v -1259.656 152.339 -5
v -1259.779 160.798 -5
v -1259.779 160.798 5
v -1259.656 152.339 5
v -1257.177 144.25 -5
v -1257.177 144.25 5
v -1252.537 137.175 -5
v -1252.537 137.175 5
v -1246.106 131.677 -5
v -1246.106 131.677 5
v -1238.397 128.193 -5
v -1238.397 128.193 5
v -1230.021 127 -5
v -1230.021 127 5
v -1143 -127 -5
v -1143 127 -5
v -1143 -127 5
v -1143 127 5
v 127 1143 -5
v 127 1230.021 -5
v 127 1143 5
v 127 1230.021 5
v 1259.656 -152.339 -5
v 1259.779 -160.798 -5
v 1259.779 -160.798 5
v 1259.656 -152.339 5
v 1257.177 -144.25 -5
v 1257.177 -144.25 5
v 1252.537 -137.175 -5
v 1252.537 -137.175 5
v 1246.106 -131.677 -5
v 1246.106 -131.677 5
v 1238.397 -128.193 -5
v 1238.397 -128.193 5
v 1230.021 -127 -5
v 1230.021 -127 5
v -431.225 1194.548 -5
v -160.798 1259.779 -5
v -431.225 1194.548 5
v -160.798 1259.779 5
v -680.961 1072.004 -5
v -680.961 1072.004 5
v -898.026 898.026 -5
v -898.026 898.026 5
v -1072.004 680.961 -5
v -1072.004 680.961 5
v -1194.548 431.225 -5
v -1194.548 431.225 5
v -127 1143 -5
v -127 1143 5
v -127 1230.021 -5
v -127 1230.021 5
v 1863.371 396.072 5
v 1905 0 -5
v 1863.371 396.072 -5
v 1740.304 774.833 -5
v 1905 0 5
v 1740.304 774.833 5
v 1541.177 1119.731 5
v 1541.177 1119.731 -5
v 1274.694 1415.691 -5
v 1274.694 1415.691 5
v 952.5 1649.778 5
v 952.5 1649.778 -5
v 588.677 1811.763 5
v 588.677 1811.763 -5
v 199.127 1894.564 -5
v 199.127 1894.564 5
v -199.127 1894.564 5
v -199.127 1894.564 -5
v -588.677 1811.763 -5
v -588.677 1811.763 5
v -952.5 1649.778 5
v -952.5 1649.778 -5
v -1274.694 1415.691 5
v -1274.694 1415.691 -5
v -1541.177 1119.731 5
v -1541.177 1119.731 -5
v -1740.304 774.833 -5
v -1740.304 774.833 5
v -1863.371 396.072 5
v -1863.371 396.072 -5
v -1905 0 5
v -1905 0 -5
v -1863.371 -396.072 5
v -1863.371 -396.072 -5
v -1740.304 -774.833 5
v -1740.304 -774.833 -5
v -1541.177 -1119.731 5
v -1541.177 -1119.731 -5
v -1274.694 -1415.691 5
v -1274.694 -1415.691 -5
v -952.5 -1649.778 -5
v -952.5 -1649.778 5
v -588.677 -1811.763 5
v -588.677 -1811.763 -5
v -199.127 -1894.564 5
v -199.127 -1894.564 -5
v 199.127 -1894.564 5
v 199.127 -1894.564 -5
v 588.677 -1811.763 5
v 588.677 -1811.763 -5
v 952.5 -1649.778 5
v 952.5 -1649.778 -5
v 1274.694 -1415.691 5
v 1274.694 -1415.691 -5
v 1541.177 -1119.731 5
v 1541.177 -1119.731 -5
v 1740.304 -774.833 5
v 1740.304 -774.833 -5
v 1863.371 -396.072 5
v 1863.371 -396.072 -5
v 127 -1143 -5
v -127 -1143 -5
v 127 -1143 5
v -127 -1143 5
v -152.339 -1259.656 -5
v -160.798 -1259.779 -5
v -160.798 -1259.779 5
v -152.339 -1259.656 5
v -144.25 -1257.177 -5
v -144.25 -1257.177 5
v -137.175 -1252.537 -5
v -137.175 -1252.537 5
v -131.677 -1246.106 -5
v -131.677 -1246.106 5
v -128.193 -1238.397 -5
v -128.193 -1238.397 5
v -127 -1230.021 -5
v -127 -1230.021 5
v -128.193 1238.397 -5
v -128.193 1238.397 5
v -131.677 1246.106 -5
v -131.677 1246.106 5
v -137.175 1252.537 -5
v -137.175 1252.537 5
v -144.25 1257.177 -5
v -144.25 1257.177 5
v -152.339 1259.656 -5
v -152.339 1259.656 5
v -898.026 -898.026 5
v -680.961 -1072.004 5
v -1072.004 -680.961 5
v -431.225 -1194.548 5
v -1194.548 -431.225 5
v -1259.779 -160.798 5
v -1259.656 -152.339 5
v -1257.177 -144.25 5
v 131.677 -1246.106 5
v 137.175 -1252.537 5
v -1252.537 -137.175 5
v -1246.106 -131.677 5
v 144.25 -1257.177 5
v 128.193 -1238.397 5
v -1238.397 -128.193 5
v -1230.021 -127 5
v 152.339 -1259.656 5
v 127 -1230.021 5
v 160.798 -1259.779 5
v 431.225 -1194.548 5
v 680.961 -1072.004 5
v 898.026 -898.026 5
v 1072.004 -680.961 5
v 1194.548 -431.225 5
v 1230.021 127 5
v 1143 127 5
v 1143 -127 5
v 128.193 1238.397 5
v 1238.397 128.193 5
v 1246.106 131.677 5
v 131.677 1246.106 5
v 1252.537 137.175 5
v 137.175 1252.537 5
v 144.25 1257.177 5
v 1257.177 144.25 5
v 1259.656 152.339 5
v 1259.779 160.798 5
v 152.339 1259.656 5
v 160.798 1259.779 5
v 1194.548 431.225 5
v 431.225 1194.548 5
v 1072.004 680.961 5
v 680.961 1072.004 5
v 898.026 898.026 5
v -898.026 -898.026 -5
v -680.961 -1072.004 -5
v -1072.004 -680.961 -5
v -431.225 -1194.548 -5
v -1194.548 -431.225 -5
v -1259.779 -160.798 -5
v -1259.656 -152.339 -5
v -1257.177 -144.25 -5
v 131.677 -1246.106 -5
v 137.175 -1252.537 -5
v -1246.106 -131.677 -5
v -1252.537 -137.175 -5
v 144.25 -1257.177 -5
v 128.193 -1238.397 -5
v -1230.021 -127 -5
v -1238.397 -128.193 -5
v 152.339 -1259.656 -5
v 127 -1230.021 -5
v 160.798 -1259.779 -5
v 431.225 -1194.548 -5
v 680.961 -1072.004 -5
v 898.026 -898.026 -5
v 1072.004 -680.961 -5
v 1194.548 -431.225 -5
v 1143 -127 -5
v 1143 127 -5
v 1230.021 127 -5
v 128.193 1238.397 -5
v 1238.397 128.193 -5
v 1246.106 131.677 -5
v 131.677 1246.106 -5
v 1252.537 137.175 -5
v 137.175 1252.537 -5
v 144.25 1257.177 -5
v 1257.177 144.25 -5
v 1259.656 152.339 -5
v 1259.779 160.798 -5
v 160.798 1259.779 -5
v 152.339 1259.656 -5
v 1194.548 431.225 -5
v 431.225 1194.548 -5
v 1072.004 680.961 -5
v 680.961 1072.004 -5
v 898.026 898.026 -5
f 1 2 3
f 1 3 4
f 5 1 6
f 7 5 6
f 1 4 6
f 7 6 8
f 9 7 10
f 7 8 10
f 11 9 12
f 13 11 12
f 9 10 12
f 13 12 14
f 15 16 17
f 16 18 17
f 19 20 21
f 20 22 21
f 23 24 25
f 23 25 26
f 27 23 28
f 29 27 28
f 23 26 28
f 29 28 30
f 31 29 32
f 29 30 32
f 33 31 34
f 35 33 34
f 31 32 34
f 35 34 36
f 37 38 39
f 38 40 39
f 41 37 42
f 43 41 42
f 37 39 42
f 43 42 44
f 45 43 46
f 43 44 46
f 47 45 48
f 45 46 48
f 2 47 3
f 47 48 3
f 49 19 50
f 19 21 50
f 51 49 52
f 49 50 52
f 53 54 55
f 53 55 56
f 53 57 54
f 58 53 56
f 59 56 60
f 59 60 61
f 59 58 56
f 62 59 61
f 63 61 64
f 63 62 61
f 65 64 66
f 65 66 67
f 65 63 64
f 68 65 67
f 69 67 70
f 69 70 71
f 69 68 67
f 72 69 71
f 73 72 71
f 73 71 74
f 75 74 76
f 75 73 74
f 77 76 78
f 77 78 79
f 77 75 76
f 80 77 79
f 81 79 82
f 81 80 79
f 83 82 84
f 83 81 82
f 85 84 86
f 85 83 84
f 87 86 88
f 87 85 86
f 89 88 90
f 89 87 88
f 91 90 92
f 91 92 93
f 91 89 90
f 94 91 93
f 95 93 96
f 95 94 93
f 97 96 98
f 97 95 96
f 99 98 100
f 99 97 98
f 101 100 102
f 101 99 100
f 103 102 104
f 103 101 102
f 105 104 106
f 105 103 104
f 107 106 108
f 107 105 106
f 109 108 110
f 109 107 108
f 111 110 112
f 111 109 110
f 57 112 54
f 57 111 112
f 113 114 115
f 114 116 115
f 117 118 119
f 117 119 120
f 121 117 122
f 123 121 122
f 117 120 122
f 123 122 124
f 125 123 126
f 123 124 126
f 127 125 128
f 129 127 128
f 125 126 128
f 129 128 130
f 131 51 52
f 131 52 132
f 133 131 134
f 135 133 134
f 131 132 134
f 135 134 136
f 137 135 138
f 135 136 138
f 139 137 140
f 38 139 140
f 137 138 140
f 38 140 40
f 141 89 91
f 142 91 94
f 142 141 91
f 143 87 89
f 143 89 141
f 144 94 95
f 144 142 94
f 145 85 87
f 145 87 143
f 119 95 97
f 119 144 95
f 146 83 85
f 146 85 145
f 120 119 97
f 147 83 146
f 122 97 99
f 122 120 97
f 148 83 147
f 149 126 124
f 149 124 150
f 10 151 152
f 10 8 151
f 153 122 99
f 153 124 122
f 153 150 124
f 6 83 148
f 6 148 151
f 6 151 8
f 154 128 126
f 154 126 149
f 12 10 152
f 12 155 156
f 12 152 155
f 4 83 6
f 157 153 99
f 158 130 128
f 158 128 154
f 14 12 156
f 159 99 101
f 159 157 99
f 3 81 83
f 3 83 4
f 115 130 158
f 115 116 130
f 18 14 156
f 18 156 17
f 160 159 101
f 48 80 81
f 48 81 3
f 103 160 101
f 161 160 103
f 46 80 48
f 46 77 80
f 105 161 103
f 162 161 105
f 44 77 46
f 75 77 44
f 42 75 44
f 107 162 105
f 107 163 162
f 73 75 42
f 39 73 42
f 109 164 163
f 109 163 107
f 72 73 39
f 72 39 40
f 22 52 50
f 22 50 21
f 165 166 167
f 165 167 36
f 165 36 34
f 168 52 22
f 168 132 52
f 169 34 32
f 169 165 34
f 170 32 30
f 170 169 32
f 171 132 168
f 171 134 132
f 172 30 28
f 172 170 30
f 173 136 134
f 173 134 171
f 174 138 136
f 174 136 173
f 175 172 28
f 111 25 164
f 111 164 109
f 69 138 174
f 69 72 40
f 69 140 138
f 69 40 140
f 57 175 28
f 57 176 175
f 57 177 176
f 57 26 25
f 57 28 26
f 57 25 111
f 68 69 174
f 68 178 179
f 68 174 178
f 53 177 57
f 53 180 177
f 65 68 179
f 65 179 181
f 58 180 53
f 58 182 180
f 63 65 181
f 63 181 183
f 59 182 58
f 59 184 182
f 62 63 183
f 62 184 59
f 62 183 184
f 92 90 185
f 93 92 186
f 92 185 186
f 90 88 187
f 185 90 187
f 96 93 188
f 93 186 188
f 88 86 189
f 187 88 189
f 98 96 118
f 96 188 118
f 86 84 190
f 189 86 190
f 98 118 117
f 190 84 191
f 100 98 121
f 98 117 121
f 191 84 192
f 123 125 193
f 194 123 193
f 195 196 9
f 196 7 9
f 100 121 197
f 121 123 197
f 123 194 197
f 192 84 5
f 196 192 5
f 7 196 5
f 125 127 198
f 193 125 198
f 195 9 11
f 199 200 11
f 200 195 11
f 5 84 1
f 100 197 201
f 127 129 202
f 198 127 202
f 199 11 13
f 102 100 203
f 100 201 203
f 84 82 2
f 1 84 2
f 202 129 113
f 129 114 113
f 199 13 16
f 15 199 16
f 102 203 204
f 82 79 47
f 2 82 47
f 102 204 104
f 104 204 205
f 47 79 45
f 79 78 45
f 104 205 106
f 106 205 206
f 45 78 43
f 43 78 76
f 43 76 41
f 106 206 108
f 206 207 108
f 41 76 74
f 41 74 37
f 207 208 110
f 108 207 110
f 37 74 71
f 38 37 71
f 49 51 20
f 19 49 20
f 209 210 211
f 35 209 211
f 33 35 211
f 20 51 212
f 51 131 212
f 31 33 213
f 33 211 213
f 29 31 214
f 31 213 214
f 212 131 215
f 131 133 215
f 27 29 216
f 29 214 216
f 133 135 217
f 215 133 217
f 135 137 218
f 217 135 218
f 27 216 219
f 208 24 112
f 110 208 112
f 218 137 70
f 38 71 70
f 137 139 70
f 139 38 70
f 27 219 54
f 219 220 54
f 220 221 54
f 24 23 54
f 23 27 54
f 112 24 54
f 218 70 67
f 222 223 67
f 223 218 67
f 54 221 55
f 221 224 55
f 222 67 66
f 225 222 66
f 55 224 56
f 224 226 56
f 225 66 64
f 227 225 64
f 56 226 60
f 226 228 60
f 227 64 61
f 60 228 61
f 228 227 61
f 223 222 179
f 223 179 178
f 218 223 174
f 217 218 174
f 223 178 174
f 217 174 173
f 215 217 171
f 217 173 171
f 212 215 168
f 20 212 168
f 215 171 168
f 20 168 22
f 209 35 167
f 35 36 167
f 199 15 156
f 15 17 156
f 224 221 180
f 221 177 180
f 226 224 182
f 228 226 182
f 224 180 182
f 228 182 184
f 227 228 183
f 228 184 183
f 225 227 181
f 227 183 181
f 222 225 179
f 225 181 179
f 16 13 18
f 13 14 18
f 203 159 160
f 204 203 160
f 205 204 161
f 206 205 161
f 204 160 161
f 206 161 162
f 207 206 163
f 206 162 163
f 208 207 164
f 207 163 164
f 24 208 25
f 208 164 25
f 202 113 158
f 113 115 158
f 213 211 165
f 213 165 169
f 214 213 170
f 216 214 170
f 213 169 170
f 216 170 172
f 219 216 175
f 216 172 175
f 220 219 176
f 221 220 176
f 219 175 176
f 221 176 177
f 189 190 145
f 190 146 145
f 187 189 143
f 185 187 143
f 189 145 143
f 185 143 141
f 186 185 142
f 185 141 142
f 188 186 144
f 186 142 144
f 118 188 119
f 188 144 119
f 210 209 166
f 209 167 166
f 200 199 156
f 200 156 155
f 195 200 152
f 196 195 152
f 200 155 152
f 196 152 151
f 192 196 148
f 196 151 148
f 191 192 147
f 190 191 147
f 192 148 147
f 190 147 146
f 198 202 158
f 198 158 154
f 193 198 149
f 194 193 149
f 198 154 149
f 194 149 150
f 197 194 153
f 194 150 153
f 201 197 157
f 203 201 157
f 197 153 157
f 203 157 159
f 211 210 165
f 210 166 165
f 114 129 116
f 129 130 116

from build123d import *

# Parameters (mm, degrees)
SKETCH1_R           = 1905
BOSS_EXTRUDE1_DEPTH = 5


with BuildPart() as part:
    # Sketch1 → Boss-Extrude1 (new, symmetric)
    with BuildSketch(Plane.XY):
        Circle(SKETCH1_R)
        with BuildLine():
            ThreePointArc((160.798387097, -1259.779297618), (898.025612107, -898.025612107), (1259.779297618, -160.798387097))
            ThreePointArc((1259.779297618, -160.798387097), (1252.536854788, -137.175162206), (1230.020731533, -127))
            Line((1230.020731533, -127), (1143, -127))
            Line((1143, -127), (1143, 127))
            Line((1143, 127), (1230.020731533, 127))
            ThreePointArc((1230.020731533, 127), (1252.536854788, 137.175162206), (1259.779297618, 160.798387097))
            ThreePointArc((1259.779297618, 160.798387097), (898.025612107, 898.025612107), (160.798387097, 1259.779297618))
            ThreePointArc((160.798387097, 1259.779297618), (137.175162206, 1252.536854788), (127, 1230.020731533))
            Line((127, 1230.020731533), (127, 1143))
            Line((127, 1143), (-127, 1143))
            Line((-127, 1143), (-127, 1230.020731533))
            ThreePointArc((-127, 1230.020731533), (-137.175162206, 1252.536854788), (-160.798387097, 1259.779297618))
            ThreePointArc((-160.798387097, 1259.779297618), (-898.025612107, 898.025612107), (-1259.779297618, 160.798387097))
            ThreePointArc((-1259.779297618, 160.798387097), (-1252.536854788, 137.175162206), (-1230.020731533, 127))
            Line((-1230.020731533, 127), (-1143, 127))
            Line((-1143, 127), (-1143, -127))
            Line((-1143, -127), (-1230.020731533, -127))
            ThreePointArc((-1230.020731533, -127), (-1252.536854788, -137.175162206), (-1259.779297618, -160.798387097))
            ThreePointArc((-1259.779297618, -160.798387097), (-898.025612107, -898.025612107), (-160.798387097, -1259.779297618))
            ThreePointArc((-160.798387097, -1259.779297618), (-137.175162206, -1252.536854788), (-127, -1230.020731533))
            Line((-127, -1230.020731533), (-127, -1143))
            Line((-127, -1143), (127, -1143))
            Line((127, -1143), (127, -1230.020731533))
            ThreePointArc((127, -1230.020731533), (137.175162206, -1252.536854788), (160.798387097, -1259.779297618))
        make_face(mode=Mode.SUBTRACT)
    extrude(amount=BOSS_EXTRUDE1_DEPTH, both=True)


solid = part.part
